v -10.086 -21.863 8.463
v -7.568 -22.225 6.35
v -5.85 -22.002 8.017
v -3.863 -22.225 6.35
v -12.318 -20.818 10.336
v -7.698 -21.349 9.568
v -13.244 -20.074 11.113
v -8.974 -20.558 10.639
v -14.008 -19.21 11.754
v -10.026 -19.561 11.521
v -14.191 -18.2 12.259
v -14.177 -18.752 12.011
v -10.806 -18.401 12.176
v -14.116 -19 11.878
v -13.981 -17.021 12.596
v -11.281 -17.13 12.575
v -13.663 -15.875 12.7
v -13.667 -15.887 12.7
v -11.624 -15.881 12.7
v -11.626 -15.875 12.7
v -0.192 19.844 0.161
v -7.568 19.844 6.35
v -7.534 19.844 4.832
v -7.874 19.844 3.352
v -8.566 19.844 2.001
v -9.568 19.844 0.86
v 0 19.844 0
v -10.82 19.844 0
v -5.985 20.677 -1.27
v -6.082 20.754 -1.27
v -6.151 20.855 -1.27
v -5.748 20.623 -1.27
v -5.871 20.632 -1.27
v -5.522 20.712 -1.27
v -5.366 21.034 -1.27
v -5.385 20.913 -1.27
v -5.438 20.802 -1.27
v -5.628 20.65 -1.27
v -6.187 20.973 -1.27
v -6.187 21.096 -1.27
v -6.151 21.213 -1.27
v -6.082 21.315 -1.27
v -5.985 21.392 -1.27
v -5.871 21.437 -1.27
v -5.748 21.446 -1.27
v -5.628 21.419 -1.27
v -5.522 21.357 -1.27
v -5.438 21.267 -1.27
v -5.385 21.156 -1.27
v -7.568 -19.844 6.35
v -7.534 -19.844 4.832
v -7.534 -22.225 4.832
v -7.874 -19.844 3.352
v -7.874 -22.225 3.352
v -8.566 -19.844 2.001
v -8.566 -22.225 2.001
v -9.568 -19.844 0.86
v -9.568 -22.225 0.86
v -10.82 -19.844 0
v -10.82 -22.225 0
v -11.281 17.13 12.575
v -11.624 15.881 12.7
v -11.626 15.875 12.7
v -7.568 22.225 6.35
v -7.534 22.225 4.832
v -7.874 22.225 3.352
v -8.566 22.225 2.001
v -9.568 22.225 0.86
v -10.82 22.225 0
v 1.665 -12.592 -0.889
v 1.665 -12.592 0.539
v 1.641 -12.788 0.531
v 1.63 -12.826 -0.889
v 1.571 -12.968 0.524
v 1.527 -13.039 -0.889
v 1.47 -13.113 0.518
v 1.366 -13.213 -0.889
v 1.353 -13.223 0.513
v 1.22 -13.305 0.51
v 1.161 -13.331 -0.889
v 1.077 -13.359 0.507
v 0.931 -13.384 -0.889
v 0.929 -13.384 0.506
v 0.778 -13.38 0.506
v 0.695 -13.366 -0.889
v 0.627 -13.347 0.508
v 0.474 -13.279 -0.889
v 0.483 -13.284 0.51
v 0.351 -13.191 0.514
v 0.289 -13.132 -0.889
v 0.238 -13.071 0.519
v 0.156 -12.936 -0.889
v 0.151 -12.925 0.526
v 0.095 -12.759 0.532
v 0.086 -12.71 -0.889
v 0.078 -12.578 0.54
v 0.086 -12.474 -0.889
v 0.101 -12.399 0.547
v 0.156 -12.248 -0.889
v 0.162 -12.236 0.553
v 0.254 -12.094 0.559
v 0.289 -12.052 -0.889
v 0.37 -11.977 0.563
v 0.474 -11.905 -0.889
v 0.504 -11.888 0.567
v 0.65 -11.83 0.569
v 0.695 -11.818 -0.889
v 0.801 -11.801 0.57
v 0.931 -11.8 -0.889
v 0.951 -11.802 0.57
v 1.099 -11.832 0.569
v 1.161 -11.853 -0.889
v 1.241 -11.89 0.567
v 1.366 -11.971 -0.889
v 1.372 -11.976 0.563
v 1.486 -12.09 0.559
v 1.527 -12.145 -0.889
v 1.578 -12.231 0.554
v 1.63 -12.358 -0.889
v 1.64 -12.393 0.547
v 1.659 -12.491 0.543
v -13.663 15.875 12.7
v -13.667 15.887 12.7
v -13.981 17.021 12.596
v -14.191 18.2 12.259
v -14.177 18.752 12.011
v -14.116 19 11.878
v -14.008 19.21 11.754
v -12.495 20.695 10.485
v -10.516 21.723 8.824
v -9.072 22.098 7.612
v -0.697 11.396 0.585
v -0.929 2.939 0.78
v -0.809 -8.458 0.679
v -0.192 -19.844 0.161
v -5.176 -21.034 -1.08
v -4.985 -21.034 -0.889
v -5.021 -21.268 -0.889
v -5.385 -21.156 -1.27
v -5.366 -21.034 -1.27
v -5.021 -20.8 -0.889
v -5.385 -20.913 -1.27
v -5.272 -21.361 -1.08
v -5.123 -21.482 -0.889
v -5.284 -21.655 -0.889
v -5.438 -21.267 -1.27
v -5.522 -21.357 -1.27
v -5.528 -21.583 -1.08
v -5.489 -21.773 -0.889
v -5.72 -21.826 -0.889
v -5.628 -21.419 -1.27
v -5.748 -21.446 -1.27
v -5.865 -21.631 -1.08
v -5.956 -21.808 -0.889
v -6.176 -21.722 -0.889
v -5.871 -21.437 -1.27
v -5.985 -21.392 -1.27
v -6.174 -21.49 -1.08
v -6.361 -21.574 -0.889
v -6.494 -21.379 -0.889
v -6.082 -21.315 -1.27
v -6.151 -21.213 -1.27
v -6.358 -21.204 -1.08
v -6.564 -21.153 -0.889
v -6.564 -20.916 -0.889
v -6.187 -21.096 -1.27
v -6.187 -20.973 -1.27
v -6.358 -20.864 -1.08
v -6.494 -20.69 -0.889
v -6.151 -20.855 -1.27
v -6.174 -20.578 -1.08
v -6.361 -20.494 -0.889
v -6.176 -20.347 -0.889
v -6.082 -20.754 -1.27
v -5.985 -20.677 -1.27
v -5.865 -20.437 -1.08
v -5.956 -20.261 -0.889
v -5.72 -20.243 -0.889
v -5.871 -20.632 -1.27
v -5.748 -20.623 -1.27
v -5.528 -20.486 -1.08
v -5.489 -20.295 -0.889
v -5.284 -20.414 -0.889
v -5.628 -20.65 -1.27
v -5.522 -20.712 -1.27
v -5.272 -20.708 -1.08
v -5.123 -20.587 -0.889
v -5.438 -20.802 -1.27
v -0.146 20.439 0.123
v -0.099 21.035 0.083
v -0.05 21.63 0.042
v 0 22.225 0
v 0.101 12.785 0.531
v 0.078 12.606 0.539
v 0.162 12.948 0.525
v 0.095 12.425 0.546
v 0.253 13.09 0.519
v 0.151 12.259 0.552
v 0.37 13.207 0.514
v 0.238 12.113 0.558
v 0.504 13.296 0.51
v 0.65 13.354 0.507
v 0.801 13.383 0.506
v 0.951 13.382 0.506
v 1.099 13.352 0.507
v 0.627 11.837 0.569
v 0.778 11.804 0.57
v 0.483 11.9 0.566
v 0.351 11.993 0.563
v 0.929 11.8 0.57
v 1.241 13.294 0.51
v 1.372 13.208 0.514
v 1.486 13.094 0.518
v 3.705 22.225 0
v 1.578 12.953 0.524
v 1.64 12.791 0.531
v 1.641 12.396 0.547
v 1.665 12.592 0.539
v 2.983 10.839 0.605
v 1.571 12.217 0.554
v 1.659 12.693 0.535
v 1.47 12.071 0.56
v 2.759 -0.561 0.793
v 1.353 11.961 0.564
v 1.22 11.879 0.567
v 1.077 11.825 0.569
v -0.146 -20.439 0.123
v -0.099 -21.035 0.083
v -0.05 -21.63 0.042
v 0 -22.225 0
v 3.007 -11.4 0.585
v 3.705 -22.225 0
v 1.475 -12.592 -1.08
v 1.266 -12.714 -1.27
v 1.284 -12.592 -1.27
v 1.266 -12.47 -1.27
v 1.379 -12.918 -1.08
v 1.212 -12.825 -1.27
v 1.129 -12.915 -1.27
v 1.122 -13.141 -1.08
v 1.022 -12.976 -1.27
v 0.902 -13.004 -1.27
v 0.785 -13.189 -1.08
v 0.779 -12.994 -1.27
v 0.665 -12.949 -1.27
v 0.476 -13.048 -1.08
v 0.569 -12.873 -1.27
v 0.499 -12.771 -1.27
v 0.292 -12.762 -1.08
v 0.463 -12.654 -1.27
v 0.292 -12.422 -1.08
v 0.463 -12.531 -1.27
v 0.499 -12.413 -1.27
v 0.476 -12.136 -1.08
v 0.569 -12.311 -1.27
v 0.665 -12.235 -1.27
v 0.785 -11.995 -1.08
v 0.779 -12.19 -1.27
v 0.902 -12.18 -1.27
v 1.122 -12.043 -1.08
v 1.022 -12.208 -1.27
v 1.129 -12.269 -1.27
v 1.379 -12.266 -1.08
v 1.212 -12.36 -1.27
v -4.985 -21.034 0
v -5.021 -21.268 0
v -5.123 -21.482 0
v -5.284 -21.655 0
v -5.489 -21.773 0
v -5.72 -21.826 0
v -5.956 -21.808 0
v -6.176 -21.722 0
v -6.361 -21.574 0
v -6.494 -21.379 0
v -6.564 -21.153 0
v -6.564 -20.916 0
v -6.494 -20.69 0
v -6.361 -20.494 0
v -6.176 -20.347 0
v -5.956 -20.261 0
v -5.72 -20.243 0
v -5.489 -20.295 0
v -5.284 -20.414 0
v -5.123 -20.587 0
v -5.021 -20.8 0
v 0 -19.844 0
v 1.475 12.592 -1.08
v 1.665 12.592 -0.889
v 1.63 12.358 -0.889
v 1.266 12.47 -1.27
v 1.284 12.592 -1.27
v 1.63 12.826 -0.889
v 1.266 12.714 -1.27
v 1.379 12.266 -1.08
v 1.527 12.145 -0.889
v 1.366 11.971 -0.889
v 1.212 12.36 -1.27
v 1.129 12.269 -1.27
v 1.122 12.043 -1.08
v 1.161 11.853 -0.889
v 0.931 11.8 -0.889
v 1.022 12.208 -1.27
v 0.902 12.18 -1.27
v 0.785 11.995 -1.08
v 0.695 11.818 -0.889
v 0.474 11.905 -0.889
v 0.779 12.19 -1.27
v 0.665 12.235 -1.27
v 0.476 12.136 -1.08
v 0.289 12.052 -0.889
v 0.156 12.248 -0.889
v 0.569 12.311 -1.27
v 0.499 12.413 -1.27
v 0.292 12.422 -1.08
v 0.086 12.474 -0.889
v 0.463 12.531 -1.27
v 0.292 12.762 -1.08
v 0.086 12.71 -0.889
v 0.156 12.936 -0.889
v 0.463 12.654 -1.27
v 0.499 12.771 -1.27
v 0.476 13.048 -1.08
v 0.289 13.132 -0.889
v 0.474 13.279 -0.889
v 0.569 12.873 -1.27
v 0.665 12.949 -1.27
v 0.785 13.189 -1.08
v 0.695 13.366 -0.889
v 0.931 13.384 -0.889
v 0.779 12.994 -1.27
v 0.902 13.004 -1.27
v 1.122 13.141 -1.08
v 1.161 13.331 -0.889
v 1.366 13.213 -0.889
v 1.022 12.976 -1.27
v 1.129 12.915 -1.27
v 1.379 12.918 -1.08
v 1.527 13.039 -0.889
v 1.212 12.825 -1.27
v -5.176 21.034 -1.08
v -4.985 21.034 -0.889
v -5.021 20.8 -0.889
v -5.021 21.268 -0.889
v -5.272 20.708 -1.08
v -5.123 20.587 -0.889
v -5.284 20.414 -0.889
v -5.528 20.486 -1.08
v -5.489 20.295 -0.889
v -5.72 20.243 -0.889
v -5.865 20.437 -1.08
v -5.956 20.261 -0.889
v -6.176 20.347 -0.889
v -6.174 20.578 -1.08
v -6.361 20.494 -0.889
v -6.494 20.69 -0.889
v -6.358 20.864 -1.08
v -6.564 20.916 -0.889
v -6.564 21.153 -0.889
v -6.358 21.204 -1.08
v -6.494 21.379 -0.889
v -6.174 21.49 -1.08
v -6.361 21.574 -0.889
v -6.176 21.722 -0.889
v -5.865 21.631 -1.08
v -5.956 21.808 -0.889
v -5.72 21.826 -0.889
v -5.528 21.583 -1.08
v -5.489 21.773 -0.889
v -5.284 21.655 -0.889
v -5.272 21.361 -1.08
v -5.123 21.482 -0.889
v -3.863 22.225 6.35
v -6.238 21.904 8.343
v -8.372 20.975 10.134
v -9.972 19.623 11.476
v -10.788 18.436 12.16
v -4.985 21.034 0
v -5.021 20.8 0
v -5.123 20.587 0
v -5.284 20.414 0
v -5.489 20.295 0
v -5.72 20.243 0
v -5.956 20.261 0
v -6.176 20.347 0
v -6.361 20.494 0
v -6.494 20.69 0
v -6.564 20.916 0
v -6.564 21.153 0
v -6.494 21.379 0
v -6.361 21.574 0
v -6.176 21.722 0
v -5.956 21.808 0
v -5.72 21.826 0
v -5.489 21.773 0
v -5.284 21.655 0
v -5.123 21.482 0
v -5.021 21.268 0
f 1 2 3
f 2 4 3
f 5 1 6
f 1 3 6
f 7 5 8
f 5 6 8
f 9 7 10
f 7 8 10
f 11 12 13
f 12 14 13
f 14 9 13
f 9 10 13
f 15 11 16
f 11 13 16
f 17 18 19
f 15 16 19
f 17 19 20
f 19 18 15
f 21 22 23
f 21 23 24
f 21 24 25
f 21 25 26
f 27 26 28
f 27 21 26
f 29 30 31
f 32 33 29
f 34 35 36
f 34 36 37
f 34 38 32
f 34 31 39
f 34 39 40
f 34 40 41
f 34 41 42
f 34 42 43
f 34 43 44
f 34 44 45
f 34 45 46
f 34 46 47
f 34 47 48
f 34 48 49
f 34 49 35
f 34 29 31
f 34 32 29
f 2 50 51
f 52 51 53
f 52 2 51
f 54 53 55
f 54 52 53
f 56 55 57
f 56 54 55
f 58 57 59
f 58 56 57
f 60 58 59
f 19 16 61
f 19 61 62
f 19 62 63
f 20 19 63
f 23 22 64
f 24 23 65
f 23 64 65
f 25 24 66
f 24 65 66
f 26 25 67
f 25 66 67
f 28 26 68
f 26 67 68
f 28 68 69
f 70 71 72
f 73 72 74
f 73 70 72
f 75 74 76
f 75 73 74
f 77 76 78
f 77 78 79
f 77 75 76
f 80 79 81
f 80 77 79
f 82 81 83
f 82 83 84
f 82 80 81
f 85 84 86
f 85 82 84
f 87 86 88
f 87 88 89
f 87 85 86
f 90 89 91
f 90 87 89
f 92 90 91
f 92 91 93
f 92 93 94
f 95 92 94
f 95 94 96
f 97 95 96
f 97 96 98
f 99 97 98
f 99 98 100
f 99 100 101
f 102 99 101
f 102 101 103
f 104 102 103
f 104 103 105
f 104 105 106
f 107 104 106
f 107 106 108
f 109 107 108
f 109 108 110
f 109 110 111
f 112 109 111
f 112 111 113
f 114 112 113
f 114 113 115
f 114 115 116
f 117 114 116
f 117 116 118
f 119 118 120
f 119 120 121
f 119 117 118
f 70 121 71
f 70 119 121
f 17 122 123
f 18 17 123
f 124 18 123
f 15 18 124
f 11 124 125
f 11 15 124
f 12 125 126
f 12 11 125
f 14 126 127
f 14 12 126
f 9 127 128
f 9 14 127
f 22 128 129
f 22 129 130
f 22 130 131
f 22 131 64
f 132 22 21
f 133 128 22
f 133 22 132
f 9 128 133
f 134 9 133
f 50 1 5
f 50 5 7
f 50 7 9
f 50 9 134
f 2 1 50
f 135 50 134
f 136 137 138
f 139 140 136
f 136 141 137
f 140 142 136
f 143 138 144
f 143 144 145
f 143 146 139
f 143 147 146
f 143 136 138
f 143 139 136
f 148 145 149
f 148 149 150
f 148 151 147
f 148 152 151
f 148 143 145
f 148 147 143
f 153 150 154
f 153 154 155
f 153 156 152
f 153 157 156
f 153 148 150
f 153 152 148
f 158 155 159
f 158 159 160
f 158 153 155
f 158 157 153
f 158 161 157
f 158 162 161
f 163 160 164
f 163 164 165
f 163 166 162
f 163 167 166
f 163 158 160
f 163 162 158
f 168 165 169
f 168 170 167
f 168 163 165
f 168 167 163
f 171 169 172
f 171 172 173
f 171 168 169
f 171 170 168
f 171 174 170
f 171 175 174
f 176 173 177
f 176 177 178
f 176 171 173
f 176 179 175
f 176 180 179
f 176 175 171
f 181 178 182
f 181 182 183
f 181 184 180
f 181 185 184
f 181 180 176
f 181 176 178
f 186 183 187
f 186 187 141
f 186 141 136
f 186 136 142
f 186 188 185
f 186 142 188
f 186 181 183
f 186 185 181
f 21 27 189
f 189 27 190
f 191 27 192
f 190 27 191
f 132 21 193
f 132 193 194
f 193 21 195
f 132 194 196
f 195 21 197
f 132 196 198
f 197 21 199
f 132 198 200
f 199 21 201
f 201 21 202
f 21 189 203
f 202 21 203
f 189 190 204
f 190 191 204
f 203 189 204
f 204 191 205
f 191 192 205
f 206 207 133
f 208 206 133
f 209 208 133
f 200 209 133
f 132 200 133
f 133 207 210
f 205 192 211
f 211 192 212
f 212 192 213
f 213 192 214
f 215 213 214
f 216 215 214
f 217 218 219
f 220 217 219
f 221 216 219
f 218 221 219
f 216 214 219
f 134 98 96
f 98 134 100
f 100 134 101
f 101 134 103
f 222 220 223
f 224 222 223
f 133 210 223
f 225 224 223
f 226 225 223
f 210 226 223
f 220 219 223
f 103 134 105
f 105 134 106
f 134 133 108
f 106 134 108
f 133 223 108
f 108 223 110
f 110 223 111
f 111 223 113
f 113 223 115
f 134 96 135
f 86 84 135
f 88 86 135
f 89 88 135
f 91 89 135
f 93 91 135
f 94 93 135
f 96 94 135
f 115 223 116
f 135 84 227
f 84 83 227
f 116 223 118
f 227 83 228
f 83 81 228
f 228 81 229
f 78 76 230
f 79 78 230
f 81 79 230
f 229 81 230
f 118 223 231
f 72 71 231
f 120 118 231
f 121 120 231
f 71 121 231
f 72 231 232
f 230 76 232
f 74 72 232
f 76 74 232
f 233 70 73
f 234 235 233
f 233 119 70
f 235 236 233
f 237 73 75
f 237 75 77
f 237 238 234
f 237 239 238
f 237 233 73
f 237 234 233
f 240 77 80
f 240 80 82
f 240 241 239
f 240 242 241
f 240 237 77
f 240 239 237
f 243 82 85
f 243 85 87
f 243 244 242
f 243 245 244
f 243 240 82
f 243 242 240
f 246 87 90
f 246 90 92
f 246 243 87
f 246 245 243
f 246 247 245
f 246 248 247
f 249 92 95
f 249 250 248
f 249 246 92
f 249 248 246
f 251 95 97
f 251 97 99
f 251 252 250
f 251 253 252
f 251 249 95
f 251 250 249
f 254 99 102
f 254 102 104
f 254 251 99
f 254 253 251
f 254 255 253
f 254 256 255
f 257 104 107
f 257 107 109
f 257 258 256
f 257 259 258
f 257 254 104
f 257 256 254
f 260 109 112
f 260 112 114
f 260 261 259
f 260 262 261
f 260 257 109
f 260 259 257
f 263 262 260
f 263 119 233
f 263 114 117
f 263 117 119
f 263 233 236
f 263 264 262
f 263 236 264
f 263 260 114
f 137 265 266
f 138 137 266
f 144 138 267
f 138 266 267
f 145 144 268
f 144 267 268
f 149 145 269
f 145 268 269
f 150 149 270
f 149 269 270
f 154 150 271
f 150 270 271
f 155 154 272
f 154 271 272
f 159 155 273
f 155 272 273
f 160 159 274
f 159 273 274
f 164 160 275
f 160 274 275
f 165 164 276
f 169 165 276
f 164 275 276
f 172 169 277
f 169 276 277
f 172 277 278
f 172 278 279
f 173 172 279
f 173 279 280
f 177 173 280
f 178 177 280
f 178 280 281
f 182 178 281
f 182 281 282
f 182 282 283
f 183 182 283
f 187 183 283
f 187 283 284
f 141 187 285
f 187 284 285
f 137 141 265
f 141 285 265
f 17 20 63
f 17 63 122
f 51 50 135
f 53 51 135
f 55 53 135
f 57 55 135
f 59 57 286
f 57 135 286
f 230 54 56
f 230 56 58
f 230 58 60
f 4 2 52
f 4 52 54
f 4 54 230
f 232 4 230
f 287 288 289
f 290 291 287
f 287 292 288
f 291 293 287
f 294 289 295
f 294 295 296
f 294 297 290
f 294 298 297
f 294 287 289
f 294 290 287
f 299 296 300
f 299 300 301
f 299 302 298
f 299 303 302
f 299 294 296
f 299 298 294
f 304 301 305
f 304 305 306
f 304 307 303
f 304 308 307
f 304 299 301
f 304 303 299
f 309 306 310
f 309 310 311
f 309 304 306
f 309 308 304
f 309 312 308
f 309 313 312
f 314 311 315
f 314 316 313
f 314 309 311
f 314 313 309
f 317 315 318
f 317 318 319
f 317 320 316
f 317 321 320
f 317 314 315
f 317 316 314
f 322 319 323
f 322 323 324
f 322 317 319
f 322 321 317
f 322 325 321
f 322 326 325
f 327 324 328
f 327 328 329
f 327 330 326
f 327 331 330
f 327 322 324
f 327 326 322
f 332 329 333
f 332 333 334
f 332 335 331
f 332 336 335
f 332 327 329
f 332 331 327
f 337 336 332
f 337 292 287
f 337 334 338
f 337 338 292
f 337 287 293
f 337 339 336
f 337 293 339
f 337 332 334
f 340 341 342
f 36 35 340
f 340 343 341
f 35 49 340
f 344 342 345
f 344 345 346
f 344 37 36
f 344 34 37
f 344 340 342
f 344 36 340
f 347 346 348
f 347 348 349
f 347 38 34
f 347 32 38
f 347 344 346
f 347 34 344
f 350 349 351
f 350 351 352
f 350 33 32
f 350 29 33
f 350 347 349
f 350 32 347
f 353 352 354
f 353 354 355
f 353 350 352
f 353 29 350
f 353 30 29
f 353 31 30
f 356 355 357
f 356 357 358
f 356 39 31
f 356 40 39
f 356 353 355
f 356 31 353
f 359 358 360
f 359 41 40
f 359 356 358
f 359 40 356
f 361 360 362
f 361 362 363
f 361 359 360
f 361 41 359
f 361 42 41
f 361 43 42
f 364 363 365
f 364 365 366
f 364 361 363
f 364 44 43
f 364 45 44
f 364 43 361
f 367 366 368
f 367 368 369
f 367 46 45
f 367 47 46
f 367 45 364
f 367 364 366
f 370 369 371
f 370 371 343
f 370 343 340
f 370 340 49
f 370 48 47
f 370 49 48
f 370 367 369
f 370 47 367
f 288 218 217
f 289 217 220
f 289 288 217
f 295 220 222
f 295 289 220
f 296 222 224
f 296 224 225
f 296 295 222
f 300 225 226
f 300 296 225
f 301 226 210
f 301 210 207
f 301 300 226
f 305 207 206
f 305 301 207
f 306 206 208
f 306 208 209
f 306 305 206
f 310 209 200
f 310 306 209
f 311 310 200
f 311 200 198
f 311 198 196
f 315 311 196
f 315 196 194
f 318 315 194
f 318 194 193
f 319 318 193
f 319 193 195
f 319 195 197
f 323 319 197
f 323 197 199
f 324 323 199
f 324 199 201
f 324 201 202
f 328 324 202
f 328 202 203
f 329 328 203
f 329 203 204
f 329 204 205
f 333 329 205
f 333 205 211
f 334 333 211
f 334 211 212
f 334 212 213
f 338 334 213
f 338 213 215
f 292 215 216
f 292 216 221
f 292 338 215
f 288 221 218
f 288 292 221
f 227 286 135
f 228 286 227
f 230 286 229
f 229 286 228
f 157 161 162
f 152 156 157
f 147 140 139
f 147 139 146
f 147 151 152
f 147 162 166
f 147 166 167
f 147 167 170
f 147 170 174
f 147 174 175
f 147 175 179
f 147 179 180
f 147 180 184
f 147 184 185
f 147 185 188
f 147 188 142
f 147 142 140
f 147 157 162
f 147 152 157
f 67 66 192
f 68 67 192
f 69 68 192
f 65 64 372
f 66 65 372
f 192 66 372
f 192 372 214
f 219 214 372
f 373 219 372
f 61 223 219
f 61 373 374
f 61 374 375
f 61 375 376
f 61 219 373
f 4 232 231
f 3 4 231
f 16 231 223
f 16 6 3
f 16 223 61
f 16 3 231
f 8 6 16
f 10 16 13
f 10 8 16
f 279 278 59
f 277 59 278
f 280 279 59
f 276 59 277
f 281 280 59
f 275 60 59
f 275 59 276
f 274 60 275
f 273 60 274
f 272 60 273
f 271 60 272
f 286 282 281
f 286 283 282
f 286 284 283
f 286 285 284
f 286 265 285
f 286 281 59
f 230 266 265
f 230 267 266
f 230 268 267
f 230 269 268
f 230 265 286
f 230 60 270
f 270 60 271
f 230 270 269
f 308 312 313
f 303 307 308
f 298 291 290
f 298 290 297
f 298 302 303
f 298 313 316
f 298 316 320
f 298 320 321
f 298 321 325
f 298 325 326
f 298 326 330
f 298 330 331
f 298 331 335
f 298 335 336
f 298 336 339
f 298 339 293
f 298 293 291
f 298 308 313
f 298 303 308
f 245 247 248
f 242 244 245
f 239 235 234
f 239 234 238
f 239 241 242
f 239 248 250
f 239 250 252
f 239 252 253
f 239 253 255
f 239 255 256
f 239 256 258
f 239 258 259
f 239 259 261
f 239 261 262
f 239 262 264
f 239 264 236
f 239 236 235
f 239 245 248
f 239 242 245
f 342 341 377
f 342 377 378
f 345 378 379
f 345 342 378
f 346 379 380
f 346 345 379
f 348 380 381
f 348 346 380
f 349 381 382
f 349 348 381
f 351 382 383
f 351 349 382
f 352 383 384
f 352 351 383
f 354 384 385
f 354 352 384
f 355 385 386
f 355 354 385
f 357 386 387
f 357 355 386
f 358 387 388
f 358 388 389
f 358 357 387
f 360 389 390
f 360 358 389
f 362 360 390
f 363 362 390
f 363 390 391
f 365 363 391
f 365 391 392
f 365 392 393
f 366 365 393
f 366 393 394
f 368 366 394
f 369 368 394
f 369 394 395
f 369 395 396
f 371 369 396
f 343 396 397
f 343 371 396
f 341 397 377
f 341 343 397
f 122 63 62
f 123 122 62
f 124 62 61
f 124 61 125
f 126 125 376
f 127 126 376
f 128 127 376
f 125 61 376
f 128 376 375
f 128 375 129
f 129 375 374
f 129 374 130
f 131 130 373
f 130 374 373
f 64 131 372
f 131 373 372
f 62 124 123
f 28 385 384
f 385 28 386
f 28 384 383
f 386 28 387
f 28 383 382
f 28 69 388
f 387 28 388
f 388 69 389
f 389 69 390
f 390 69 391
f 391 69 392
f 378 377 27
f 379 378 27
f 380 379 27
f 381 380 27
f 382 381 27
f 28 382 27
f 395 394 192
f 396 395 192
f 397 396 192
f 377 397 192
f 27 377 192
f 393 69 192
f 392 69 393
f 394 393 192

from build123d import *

# Parameters (mm, degrees)
F1_DEPTH  = 22.225
F3_DEPTH  = 14.199989
F4_R      = 311.546875
F5_DEPTH  = 38.1
F7_DEPTH  = 2.38125
F9_R      = 0.79375
F10_DEPTH = 1.27
F11_SIZE  = 0.381


with BuildPart() as f1:
    # F0 (on Front) → F1 (new body, symmetric)
    with BuildSketch(Plane.XZ):
        with BuildLine():
            Line((0, 0), (3.704567, 0))
            Line((3.704567, 0), (-11.281316, 12.574649))
            ThreePointArc((-11.281316, 12.574649), (-11.442464, 12.667688), (-11.625715, 12.7))
            Line((-11.625715, 12.7), (-13.663198, 12.7))
            ThreePointArc((-13.663198, 12.7), (-14.166677, 12.347461), (-14.007598, 11.75377))
            Line((-14.007598, 11.75377), (0, 0))
        make_face()
    extrude(amount=F1_DEPTH, both=True)

    # F2 (on Right) → F3 (cut, through all)
    with BuildSketch(Plane.YZ):
        with BuildLine():
            ThreePointArc((-22.225, 6.35), (-20.365128, 10.840128), (-15.875, 12.7))
            Line((-15.875, 12.7), (-25.184002, 17.701721))
            Line((-25.184002, 17.701721), (-26.87986, 8.657143))
            Line((-26.87986, 8.657143), (-22.225, 6.35))
        make_face()
        with BuildLine():
            Line((22.225, 6.35), (26.87986, 8.657143))
            Line((26.87986, 8.657143), (25.184002, 17.701721))
            Line((25.184002, 17.701721), (15.875, 12.7))
            ThreePointArc((15.875, 12.7), (20.365128, 10.840128), (22.225, 6.35))
        make_face()
    extrude(amount=-F3_DEPTH, mode=Mode.SUBTRACT)

    # F4 (on Right) → F5 (cut, symmetric)
    with BuildSketch(Plane.YZ):
        with Locations((0, -310.753125)):
            Circle(F4_R)
    extrude(amount=F5_DEPTH, both=True, mode=Mode.SUBTRACT)

    # F6 (on face) → F7 (join)
    with BuildSketch(Plane.XZ.offset(22.225)):
        with BuildLine():
            Line((-10.819531, 0), (0, 0))
            Line((0, 0), (-7.567635, 6.35))
            ThreePointArc((-7.567635, 6.35), (-8.1783, 2.655064), (-10.819531, 0))
        make_face()
    extrude(amount=-F7_DEPTH)



with BuildPart() as f8_1:
    # F8: instance of F1
    add(f1.part.mirror(Plane.XZ))


with BuildPart() as f1_1:
    add(f1.part)

    add(f8_1.part)  # F10 merges F8_1
    # F9 (on face) → F10 (join, symmetric)
    with BuildSketch(Plane(origin=(0, 0, 0), x_dir=(1, 0, 0), z_dir=(0, 0, -1))):
        with Locations((-5.779071, 21.034375)):
            Circle(F9_R)
        with Locations((0.871276, 12.592022)):
            Circle(F9_R)
        with Locations((0.871276, -12.592022)):
            Circle(F9_R)
        with Locations((-5.779071, -21.034375)):
            Circle(F9_R)
    extrude(amount=F10_DEPTH, both=True)

    # F11
    f11_edges = [f1_1.edges().sort_by_distance(p)[0] for p in [
        (0.077526, -12.592022, -1.27),
        (-6.572821, -21.034375, -1.27),
        (0.077526, 12.592022, -1.27),
        (-6.572821, 21.034375, -1.27),
    ]]
    chamfer(f11_edges, length=F11_SIZE)


solid = f1_1.part
